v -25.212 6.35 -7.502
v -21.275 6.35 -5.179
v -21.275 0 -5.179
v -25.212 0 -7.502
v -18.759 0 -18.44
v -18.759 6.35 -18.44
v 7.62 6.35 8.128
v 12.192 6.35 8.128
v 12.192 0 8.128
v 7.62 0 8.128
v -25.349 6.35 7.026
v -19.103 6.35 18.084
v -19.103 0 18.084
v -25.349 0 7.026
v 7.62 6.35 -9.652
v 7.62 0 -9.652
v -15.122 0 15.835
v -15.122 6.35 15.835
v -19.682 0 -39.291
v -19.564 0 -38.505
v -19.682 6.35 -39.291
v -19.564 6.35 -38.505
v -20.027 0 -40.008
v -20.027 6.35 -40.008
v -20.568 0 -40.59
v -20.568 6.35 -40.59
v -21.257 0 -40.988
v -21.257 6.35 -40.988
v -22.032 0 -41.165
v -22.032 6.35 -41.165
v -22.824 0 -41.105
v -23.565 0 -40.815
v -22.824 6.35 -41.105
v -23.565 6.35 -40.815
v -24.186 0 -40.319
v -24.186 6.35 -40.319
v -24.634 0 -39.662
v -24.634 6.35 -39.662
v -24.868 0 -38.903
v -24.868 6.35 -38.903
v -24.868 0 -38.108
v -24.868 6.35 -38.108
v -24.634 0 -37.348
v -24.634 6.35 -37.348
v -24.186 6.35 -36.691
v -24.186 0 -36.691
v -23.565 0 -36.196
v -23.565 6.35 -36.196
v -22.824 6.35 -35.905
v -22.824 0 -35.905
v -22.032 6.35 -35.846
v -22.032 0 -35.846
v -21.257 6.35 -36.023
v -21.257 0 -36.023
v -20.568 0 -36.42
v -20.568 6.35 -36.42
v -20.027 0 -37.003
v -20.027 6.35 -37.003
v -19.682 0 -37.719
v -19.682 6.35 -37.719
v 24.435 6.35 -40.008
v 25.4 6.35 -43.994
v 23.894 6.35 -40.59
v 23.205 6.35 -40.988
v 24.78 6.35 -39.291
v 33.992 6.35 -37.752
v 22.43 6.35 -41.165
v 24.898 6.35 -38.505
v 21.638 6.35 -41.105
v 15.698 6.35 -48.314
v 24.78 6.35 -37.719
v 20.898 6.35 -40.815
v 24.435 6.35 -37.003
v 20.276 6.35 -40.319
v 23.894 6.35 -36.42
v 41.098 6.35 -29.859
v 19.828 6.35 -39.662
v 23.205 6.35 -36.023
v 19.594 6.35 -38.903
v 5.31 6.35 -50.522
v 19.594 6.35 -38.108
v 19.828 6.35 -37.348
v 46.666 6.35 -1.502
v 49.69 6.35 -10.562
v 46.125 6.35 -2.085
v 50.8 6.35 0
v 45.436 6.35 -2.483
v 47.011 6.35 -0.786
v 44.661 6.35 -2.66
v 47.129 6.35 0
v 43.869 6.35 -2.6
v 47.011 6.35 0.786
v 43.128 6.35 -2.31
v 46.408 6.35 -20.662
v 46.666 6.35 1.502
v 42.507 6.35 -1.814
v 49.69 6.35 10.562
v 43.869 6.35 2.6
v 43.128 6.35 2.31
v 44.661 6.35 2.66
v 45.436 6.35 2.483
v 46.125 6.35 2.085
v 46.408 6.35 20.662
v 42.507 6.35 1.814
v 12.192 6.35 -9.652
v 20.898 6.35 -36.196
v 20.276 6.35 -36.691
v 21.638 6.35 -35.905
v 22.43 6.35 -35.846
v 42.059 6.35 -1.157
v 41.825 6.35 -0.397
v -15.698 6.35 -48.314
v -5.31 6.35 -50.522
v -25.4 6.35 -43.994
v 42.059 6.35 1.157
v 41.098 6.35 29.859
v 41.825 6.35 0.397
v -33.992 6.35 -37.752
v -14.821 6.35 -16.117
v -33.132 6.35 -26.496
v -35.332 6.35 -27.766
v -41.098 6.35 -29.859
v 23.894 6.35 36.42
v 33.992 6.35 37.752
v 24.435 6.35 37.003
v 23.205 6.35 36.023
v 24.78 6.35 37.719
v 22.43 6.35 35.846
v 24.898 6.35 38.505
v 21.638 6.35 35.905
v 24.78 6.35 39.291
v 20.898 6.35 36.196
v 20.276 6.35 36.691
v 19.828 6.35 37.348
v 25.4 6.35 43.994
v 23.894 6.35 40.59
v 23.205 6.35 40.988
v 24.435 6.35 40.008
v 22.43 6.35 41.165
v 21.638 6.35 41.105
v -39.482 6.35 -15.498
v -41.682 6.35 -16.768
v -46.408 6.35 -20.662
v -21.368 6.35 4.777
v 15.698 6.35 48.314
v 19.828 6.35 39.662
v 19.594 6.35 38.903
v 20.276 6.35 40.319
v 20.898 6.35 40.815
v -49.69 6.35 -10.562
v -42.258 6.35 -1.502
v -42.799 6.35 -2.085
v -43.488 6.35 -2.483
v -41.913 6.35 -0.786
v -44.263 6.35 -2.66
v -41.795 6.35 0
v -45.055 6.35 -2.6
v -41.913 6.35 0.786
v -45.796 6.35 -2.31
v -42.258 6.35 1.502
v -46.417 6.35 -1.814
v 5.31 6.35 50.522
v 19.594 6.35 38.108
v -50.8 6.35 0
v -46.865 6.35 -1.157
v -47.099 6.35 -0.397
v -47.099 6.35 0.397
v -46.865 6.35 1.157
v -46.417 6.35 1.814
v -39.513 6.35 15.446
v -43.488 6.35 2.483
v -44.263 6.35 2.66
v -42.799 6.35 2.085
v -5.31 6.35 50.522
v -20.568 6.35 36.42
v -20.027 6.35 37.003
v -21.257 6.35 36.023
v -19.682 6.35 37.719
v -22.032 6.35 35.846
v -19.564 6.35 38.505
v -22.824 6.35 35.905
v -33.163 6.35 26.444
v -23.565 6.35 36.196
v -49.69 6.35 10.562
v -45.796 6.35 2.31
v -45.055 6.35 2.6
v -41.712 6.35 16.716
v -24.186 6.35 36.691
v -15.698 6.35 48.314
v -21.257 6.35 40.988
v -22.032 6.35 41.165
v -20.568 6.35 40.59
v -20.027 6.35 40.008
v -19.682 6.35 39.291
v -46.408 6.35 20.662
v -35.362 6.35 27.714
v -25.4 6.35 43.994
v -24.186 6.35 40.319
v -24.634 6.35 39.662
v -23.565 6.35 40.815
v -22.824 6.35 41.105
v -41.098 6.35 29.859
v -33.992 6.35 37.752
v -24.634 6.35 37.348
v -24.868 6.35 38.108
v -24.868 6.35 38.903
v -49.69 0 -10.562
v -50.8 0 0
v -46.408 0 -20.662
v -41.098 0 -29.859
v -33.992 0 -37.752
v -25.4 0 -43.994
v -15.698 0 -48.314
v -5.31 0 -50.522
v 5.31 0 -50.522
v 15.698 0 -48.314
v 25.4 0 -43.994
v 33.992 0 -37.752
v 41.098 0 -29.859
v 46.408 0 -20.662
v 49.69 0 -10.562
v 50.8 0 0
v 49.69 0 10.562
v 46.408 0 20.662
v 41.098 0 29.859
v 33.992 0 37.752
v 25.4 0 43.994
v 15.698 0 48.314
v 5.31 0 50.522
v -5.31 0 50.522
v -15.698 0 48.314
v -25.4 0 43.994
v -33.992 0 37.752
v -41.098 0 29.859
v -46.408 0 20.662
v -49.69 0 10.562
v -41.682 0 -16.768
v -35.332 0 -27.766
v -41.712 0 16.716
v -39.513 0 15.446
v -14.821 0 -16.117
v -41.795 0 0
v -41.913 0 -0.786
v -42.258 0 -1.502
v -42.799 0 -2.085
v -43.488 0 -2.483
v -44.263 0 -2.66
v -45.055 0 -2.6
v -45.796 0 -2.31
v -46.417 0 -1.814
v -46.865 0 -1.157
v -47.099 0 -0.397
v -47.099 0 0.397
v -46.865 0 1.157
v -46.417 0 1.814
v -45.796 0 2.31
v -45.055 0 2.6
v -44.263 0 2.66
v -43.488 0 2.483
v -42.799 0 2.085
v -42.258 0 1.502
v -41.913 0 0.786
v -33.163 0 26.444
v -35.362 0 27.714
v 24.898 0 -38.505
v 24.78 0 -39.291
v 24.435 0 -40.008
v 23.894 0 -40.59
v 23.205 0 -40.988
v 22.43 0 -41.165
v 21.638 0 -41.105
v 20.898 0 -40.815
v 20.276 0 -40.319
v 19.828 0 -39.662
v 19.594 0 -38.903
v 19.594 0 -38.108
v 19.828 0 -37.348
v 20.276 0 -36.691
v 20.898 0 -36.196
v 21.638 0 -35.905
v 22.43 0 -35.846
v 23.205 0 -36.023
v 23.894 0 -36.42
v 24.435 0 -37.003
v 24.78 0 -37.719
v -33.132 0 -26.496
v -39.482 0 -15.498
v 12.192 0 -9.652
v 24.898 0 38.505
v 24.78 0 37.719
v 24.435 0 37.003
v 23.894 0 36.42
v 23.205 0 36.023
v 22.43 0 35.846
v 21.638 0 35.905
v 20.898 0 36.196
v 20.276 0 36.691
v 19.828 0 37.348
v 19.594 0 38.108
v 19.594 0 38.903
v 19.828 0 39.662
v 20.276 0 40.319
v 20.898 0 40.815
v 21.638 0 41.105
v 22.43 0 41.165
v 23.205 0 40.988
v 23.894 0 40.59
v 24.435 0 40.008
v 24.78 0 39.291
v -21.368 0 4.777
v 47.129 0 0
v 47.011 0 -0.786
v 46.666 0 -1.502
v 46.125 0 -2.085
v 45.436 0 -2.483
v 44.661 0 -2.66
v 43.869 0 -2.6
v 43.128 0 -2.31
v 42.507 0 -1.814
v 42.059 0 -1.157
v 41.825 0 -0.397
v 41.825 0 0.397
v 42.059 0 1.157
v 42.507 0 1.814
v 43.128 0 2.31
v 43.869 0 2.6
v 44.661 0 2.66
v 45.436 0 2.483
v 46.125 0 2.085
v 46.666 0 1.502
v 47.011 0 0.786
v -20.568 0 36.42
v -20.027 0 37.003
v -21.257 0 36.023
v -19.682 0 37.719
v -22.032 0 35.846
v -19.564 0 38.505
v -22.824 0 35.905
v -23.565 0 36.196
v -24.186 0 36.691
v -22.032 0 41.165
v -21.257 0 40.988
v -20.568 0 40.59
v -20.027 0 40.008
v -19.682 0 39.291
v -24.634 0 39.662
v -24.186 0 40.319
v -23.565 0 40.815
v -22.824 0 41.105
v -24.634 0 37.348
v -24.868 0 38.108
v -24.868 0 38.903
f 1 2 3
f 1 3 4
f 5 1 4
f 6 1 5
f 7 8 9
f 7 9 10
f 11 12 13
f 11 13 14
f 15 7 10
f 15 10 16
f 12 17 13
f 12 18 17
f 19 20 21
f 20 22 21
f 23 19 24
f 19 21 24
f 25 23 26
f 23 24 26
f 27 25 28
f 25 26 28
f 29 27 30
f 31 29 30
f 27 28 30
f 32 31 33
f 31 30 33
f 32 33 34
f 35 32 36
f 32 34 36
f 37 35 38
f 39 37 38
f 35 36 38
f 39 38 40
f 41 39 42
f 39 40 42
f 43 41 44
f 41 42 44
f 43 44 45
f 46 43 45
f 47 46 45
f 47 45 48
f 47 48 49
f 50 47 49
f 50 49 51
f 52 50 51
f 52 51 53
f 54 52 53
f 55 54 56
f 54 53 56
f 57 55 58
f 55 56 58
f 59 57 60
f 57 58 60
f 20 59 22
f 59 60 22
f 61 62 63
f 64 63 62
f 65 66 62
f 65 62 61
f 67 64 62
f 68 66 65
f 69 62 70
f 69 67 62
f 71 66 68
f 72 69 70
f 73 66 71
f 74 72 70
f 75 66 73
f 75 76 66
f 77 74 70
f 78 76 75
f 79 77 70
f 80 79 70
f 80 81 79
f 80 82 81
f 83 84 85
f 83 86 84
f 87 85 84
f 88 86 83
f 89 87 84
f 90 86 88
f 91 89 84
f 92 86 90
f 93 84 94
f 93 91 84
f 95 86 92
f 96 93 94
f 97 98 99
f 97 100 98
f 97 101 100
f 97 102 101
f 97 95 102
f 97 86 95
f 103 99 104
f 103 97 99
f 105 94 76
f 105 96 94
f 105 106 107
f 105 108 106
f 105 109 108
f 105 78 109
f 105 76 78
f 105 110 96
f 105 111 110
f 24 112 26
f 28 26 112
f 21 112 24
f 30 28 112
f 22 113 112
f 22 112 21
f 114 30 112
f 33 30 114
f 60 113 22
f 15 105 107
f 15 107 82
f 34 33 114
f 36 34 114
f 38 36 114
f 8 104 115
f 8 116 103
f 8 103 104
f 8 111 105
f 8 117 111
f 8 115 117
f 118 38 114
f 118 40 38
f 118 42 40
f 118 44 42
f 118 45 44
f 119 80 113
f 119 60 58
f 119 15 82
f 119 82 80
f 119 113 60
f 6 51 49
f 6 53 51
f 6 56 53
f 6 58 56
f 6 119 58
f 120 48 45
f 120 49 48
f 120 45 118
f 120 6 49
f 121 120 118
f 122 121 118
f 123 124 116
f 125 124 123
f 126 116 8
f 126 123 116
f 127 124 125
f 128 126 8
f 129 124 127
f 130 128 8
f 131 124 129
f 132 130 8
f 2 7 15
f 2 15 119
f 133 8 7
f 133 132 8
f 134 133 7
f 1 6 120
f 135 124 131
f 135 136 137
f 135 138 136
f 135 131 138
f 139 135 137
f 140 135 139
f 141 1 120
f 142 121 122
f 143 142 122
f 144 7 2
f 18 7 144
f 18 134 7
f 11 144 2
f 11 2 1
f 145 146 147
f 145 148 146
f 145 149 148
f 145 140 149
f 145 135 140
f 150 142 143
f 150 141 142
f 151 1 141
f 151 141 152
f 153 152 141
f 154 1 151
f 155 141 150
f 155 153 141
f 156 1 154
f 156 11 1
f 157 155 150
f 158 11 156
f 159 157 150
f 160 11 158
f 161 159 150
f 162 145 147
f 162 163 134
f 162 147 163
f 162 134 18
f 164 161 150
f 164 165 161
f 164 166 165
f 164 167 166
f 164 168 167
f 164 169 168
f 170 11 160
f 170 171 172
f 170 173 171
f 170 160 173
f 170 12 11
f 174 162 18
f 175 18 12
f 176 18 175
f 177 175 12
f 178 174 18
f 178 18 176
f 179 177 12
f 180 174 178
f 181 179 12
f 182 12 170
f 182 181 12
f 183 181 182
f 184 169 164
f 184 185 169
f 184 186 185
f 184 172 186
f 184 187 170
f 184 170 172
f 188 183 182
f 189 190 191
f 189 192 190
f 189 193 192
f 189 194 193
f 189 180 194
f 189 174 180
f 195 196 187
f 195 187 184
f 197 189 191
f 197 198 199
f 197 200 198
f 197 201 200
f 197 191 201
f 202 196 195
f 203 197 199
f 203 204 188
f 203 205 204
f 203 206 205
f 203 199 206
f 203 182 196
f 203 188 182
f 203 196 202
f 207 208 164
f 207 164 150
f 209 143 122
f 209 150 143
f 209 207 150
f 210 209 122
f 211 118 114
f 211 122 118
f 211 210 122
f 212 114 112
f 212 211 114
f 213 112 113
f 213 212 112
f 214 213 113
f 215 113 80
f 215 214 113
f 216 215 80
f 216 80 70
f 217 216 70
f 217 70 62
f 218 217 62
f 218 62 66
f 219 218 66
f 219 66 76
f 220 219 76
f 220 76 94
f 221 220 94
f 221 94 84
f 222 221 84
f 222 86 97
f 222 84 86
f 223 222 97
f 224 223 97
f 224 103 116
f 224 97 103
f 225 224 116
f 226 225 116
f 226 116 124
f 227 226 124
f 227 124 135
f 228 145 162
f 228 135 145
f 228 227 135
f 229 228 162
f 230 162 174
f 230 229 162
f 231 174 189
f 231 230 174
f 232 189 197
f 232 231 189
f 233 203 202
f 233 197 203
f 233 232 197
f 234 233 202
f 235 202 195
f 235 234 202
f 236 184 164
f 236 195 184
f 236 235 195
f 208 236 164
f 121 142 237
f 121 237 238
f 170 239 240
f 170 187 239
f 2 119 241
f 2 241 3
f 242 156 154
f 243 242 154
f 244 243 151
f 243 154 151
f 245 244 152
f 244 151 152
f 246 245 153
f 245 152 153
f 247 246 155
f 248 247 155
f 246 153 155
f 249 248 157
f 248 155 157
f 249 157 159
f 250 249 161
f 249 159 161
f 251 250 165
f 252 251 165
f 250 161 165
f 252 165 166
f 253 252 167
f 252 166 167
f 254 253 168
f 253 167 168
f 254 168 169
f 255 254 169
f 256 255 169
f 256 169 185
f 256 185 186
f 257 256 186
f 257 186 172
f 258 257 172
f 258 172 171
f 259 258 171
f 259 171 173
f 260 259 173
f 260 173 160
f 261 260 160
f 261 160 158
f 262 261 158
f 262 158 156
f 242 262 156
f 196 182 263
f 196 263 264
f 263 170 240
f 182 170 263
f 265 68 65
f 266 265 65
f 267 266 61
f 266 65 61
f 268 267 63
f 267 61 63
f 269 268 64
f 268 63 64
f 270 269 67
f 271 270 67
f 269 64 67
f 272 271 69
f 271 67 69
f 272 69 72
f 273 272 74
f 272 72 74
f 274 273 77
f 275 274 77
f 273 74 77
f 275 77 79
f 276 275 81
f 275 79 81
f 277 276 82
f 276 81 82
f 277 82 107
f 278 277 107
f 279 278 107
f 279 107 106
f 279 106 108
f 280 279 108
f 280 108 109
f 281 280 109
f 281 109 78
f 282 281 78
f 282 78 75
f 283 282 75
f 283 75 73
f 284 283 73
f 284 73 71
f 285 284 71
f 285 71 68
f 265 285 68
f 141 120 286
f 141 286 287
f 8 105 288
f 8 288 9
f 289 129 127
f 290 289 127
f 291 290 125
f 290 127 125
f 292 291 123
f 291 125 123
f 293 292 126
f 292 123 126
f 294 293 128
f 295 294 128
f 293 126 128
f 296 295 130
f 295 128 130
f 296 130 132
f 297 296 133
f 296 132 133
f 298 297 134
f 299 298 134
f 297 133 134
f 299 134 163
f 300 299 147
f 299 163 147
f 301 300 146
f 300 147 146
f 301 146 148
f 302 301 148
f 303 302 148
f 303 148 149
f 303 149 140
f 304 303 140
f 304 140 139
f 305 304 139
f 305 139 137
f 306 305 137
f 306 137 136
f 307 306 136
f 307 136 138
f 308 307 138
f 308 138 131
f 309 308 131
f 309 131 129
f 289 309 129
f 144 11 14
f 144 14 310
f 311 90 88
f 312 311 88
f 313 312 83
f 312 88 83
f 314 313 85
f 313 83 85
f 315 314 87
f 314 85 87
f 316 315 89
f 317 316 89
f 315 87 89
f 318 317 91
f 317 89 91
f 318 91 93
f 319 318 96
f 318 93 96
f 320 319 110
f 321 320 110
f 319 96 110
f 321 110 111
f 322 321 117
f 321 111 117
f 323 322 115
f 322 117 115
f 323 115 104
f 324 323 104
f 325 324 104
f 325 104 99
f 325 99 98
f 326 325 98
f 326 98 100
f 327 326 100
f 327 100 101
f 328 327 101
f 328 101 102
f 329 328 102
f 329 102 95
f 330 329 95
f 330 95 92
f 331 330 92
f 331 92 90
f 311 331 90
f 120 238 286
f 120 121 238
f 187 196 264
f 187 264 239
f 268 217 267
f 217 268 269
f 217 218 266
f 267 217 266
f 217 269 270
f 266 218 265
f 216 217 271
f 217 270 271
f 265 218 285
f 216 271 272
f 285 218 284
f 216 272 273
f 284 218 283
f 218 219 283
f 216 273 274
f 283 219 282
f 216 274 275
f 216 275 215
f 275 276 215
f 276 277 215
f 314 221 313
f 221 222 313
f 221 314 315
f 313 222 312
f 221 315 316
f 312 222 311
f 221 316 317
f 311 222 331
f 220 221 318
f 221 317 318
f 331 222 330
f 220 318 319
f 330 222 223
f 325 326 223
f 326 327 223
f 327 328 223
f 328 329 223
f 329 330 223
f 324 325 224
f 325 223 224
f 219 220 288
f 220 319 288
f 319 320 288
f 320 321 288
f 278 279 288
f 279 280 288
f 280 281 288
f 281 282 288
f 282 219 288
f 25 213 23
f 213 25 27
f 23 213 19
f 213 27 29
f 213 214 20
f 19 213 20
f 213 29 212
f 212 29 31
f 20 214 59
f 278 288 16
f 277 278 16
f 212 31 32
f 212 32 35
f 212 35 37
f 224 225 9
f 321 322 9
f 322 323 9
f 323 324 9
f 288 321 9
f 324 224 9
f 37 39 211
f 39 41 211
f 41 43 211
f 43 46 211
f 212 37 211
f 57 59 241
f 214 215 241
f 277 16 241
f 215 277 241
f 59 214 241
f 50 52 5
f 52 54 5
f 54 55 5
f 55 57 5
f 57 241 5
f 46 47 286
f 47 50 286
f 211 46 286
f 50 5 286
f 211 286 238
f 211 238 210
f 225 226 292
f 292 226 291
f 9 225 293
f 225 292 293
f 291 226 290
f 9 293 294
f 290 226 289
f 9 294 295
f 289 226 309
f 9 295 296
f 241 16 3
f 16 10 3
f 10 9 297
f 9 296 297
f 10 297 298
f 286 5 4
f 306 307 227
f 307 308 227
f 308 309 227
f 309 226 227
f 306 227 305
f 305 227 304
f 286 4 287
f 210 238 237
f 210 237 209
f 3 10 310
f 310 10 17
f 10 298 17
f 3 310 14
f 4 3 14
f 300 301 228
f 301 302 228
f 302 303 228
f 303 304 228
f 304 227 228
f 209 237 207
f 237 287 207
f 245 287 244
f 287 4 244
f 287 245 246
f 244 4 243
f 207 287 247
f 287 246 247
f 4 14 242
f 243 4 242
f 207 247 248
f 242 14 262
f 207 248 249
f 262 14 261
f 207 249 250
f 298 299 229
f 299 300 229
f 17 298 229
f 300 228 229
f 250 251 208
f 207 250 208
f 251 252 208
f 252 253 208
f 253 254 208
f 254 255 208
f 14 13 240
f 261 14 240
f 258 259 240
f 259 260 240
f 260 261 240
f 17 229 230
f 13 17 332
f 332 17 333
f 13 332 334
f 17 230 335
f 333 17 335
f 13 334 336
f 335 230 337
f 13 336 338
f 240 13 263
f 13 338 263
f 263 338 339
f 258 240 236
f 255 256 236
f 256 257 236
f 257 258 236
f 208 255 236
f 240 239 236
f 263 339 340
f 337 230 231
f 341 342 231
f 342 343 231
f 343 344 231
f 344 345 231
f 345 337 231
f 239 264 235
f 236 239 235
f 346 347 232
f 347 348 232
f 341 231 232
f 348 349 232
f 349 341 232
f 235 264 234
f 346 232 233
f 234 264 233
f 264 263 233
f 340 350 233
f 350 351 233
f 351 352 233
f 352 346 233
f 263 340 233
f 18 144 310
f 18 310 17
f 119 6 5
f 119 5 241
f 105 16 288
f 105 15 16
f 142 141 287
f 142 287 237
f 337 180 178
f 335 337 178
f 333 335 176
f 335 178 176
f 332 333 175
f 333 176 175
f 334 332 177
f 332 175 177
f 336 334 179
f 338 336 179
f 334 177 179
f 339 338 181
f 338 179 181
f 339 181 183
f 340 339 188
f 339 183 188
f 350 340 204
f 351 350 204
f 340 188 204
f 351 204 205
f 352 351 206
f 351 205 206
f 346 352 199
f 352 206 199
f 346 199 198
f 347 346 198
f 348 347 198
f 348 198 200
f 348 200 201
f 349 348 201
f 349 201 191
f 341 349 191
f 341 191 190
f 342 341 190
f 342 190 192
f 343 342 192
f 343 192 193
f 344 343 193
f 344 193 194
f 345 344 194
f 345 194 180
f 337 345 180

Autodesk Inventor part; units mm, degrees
ref_plane "YZ Plane" through (0, 0, 0) normal (1, 0, 0) x (0, 1, 0)
ref_plane "XZ Plane" through (0, 0, 0) normal (0, 1, 0) x (-1, 0, 0)
ref_plane "XY Plane" through (0, 0, 0) normal (0, 0, 1) x (1, 0, 0)
sketch "Sketch4" plane through (0, 0, 0) normal (0, 1, 0) x (-1, 0, 0)
  circle A0 centre (0, 0) radius 50.8
  dimension "d2" = 101.6
extrude "Extrusion3" add sketch "Sketch4" along normal blind 6.35
sketch "Sketch10" plane through (0, 6.35, 0) normal (0, 1, 0) x (1, 0, 0)
  circle A0 centre (-44.462, 0) radius 2.667
  circle A1 centre (-22.231, -38.5052) radius 2.667
  circle A2 centre (22.231, -38.5052) radius 2.667
  circle A3 centre (44.462, 0) radius 2.667
  circle A4 centre (22.231, 38.5052) radius 2.667
  circle A5 centre (-22.231, 38.5052) radius 2.667
  point P0 (0, 0)
  dimension "d48" = 5.334
  dimension "d51" = 360
extrude "Extrusion6" cut sketch "Sketch10" against normal blind 6.35
sketch "Sketch13" plane through (0, 6.35, 0) normal (0, 1, 0) x (1, 0, 0)
  line L0 (-25.3494, -7.0256) -> (-21.3685, -4.7771)
  line L1 (-21.3685, -4.7771) -> (-15.1225, -15.8349)
  line L2 (-15.1225, -15.8349) -> (-19.1033, -18.0835)
  line L3 (-19.1033, -18.0835) -> (-25.3494, -7.0256)
  line L4 (-25.3494, -7.0256) -> (-21.3685, -4.7771)
  line L5 (-21.3685, -4.7771) -> (-15.1225, -15.8349)
  line L6 (-15.1225, -15.8349) -> (-19.1033, -18.0835)
  line L7 (-19.1033, -18.0835) -> (-25.3494, -7.0256)
  line L8 (-25.3494, -7.0256) -> (-21.3685, -4.7771)
  line L9 (-21.3685, -4.7771) -> (-15.1225, -15.8349)
  line L10 (-15.1225, -15.8349) -> (-19.1033, -18.0835)
  line L11 (-19.1033, -18.0835) -> (-25.3494, -7.0256)
  line L12 (-25.3494, -7.0256) -> (-21.3685, -4.7771)
  line L13 (-21.3685, -4.7771) -> (-15.1225, -15.8349)
  line L14 (-15.1225, -15.8349) -> (-19.1033, -18.0835)
  line L15 (-19.1033, -18.0835) -> (-25.3494, -7.0256)
  line L16 (-25.3494, -7.0256) -> (-21.3685, -4.7771)
  line L17 (-21.3685, -4.7771) -> (-15.1225, -15.8349)
  line L18 (-15.1225, -15.8349) -> (-19.1033, -18.0835)
  line L19 (-19.1033, -18.0835) -> (-25.3494, -7.0256)
  line L20 (-25.3494, -7.0256) -> (-21.3685, -4.7771)
  line L21 (-21.3685, -4.7771) -> (-15.1225, -15.8349)
  line L22 (-15.1225, -15.8349) -> (-19.1033, -18.0835)
  line L23 (-19.1033, -18.0835) -> (-25.3494, -7.0256)
  line L24 (-18.7591, 18.4404) -> (-14.8213, 16.1172)
  line L25 (-14.8213, 16.1172) -> (-21.2747, 5.179)
  line L26 (-21.2747, 5.179) -> (-25.2124, 7.5022)
  line L27 (-25.2124, 7.5022) -> (-18.7591, 18.4404)
  line L28 (-18.7591, 18.4404) -> (-14.8213, 16.1172)
  line L29 (-14.8213, 16.1172) -> (-21.2747, 5.179)
  line L30 (-21.2747, 5.179) -> (-25.2124, 7.5022)
  line L31 (-25.2124, 7.5022) -> (-18.7591, 18.4404)
  line L32 (-18.7591, 18.4404) -> (-14.8213, 16.1172)
  line L33 (-14.8213, 16.1172) -> (-21.2747, 5.179)
  line L34 (-21.2747, 5.179) -> (-25.2124, 7.5022)
  line L35 (-25.2124, 7.5022) -> (-18.7591, 18.4404)
  line L36 (-18.7591, 18.4404) -> (-14.8213, 16.1172)
  line L37 (-14.8213, 16.1172) -> (-21.2747, 5.179)
  line L38 (-21.2747, 5.179) -> (-25.2124, 7.5022)
  line L39 (-25.2124, 7.5022) -> (-18.7591, 18.4404)
  line L40 (-18.7591, 18.4404) -> (-14.8213, 16.1172)
  line L41 (-14.8213, 16.1172) -> (-21.2747, 5.179)
  line L42 (-21.2747, 5.179) -> (-25.2124, 7.5022)
  line L43 (-25.2124, 7.5022) -> (-18.7591, 18.4404)
  line L44 (-18.7591, 18.4404) -> (-14.8213, 16.1172)
  line L45 (-14.8213, 16.1172) -> (-21.2747, 5.179)
  line L46 (-21.2747, 5.179) -> (-25.2124, 7.5022)
  line L47 (-25.2124, 7.5022) -> (-18.7591, 18.4404)
  line L48 (7.62, 9.652) -> (12.192, 9.652)
  line L49 (12.192, 9.652) -> (12.192, -8.128)
  line L50 (12.192, -8.128) -> (7.62, -8.128)
  line L51 (7.62, -8.128) -> (7.62, 9.652)
  line L52 (-41.7125, -16.7155) -> (-39.5128, -15.4455)
  line L53 (-39.5128, -15.4455) -> (-33.1628, -26.444)
  line L54 (-33.1628, -26.444) -> (-35.3625, -27.714)
  line L55 (-35.3625, -27.714) -> (-41.7125, -16.7155)
  line L56 (-35.3322, 27.7663) -> (-33.1325, 26.4963)
  line L57 (-33.1325, 26.4963) -> (-39.4825, 15.4978)
  line L58 (-39.4825, 15.4978) -> (-41.6822, 16.7678)
  line L59 (-41.6822, 16.7678) -> (-35.3322, 27.7663)
  point P0 (0, 0)
  dimension "d57" = 4.572
  dimension "d58" = 12.7
  dimension "d59" = 4.572
  dimension "d60" = 12.7
  dimension "d61" = 4.572
  dimension "d62" = 12.7
  dimension "d63" = 4.572
  dimension "d64" = 12.7
  dimension "d65" = 4.572
  dimension "d66" = 12.7
  dimension "d67" = 4.572
  dimension "d68" = 12.7
  dimension "d69" = 4.572
  dimension "d70" = 12.7
  dimension "d71" = 4.572
  dimension "d72" = 12.7
  dimension "d73" = 4.572
  dimension "d74" = 12.7
  dimension "d75" = 4.572
  dimension "d76" = 12.7
  dimension "d77" = 4.572
  dimension "d78" = 12.7
  dimension "d79" = 4.572
  dimension "d80" = 12.7
  dimension "d81" = 4.572
  dimension "d82" = 17.78
  dimension "d109" = 2.54
  dimension "d110" = 12.7
  dimension "d113" = 2.54
  dimension "d114" = 12.7
extrude "Extrusion8" cut sketch "Sketch13" against normal blind 6.35
properties part number "cap with wire cut"
